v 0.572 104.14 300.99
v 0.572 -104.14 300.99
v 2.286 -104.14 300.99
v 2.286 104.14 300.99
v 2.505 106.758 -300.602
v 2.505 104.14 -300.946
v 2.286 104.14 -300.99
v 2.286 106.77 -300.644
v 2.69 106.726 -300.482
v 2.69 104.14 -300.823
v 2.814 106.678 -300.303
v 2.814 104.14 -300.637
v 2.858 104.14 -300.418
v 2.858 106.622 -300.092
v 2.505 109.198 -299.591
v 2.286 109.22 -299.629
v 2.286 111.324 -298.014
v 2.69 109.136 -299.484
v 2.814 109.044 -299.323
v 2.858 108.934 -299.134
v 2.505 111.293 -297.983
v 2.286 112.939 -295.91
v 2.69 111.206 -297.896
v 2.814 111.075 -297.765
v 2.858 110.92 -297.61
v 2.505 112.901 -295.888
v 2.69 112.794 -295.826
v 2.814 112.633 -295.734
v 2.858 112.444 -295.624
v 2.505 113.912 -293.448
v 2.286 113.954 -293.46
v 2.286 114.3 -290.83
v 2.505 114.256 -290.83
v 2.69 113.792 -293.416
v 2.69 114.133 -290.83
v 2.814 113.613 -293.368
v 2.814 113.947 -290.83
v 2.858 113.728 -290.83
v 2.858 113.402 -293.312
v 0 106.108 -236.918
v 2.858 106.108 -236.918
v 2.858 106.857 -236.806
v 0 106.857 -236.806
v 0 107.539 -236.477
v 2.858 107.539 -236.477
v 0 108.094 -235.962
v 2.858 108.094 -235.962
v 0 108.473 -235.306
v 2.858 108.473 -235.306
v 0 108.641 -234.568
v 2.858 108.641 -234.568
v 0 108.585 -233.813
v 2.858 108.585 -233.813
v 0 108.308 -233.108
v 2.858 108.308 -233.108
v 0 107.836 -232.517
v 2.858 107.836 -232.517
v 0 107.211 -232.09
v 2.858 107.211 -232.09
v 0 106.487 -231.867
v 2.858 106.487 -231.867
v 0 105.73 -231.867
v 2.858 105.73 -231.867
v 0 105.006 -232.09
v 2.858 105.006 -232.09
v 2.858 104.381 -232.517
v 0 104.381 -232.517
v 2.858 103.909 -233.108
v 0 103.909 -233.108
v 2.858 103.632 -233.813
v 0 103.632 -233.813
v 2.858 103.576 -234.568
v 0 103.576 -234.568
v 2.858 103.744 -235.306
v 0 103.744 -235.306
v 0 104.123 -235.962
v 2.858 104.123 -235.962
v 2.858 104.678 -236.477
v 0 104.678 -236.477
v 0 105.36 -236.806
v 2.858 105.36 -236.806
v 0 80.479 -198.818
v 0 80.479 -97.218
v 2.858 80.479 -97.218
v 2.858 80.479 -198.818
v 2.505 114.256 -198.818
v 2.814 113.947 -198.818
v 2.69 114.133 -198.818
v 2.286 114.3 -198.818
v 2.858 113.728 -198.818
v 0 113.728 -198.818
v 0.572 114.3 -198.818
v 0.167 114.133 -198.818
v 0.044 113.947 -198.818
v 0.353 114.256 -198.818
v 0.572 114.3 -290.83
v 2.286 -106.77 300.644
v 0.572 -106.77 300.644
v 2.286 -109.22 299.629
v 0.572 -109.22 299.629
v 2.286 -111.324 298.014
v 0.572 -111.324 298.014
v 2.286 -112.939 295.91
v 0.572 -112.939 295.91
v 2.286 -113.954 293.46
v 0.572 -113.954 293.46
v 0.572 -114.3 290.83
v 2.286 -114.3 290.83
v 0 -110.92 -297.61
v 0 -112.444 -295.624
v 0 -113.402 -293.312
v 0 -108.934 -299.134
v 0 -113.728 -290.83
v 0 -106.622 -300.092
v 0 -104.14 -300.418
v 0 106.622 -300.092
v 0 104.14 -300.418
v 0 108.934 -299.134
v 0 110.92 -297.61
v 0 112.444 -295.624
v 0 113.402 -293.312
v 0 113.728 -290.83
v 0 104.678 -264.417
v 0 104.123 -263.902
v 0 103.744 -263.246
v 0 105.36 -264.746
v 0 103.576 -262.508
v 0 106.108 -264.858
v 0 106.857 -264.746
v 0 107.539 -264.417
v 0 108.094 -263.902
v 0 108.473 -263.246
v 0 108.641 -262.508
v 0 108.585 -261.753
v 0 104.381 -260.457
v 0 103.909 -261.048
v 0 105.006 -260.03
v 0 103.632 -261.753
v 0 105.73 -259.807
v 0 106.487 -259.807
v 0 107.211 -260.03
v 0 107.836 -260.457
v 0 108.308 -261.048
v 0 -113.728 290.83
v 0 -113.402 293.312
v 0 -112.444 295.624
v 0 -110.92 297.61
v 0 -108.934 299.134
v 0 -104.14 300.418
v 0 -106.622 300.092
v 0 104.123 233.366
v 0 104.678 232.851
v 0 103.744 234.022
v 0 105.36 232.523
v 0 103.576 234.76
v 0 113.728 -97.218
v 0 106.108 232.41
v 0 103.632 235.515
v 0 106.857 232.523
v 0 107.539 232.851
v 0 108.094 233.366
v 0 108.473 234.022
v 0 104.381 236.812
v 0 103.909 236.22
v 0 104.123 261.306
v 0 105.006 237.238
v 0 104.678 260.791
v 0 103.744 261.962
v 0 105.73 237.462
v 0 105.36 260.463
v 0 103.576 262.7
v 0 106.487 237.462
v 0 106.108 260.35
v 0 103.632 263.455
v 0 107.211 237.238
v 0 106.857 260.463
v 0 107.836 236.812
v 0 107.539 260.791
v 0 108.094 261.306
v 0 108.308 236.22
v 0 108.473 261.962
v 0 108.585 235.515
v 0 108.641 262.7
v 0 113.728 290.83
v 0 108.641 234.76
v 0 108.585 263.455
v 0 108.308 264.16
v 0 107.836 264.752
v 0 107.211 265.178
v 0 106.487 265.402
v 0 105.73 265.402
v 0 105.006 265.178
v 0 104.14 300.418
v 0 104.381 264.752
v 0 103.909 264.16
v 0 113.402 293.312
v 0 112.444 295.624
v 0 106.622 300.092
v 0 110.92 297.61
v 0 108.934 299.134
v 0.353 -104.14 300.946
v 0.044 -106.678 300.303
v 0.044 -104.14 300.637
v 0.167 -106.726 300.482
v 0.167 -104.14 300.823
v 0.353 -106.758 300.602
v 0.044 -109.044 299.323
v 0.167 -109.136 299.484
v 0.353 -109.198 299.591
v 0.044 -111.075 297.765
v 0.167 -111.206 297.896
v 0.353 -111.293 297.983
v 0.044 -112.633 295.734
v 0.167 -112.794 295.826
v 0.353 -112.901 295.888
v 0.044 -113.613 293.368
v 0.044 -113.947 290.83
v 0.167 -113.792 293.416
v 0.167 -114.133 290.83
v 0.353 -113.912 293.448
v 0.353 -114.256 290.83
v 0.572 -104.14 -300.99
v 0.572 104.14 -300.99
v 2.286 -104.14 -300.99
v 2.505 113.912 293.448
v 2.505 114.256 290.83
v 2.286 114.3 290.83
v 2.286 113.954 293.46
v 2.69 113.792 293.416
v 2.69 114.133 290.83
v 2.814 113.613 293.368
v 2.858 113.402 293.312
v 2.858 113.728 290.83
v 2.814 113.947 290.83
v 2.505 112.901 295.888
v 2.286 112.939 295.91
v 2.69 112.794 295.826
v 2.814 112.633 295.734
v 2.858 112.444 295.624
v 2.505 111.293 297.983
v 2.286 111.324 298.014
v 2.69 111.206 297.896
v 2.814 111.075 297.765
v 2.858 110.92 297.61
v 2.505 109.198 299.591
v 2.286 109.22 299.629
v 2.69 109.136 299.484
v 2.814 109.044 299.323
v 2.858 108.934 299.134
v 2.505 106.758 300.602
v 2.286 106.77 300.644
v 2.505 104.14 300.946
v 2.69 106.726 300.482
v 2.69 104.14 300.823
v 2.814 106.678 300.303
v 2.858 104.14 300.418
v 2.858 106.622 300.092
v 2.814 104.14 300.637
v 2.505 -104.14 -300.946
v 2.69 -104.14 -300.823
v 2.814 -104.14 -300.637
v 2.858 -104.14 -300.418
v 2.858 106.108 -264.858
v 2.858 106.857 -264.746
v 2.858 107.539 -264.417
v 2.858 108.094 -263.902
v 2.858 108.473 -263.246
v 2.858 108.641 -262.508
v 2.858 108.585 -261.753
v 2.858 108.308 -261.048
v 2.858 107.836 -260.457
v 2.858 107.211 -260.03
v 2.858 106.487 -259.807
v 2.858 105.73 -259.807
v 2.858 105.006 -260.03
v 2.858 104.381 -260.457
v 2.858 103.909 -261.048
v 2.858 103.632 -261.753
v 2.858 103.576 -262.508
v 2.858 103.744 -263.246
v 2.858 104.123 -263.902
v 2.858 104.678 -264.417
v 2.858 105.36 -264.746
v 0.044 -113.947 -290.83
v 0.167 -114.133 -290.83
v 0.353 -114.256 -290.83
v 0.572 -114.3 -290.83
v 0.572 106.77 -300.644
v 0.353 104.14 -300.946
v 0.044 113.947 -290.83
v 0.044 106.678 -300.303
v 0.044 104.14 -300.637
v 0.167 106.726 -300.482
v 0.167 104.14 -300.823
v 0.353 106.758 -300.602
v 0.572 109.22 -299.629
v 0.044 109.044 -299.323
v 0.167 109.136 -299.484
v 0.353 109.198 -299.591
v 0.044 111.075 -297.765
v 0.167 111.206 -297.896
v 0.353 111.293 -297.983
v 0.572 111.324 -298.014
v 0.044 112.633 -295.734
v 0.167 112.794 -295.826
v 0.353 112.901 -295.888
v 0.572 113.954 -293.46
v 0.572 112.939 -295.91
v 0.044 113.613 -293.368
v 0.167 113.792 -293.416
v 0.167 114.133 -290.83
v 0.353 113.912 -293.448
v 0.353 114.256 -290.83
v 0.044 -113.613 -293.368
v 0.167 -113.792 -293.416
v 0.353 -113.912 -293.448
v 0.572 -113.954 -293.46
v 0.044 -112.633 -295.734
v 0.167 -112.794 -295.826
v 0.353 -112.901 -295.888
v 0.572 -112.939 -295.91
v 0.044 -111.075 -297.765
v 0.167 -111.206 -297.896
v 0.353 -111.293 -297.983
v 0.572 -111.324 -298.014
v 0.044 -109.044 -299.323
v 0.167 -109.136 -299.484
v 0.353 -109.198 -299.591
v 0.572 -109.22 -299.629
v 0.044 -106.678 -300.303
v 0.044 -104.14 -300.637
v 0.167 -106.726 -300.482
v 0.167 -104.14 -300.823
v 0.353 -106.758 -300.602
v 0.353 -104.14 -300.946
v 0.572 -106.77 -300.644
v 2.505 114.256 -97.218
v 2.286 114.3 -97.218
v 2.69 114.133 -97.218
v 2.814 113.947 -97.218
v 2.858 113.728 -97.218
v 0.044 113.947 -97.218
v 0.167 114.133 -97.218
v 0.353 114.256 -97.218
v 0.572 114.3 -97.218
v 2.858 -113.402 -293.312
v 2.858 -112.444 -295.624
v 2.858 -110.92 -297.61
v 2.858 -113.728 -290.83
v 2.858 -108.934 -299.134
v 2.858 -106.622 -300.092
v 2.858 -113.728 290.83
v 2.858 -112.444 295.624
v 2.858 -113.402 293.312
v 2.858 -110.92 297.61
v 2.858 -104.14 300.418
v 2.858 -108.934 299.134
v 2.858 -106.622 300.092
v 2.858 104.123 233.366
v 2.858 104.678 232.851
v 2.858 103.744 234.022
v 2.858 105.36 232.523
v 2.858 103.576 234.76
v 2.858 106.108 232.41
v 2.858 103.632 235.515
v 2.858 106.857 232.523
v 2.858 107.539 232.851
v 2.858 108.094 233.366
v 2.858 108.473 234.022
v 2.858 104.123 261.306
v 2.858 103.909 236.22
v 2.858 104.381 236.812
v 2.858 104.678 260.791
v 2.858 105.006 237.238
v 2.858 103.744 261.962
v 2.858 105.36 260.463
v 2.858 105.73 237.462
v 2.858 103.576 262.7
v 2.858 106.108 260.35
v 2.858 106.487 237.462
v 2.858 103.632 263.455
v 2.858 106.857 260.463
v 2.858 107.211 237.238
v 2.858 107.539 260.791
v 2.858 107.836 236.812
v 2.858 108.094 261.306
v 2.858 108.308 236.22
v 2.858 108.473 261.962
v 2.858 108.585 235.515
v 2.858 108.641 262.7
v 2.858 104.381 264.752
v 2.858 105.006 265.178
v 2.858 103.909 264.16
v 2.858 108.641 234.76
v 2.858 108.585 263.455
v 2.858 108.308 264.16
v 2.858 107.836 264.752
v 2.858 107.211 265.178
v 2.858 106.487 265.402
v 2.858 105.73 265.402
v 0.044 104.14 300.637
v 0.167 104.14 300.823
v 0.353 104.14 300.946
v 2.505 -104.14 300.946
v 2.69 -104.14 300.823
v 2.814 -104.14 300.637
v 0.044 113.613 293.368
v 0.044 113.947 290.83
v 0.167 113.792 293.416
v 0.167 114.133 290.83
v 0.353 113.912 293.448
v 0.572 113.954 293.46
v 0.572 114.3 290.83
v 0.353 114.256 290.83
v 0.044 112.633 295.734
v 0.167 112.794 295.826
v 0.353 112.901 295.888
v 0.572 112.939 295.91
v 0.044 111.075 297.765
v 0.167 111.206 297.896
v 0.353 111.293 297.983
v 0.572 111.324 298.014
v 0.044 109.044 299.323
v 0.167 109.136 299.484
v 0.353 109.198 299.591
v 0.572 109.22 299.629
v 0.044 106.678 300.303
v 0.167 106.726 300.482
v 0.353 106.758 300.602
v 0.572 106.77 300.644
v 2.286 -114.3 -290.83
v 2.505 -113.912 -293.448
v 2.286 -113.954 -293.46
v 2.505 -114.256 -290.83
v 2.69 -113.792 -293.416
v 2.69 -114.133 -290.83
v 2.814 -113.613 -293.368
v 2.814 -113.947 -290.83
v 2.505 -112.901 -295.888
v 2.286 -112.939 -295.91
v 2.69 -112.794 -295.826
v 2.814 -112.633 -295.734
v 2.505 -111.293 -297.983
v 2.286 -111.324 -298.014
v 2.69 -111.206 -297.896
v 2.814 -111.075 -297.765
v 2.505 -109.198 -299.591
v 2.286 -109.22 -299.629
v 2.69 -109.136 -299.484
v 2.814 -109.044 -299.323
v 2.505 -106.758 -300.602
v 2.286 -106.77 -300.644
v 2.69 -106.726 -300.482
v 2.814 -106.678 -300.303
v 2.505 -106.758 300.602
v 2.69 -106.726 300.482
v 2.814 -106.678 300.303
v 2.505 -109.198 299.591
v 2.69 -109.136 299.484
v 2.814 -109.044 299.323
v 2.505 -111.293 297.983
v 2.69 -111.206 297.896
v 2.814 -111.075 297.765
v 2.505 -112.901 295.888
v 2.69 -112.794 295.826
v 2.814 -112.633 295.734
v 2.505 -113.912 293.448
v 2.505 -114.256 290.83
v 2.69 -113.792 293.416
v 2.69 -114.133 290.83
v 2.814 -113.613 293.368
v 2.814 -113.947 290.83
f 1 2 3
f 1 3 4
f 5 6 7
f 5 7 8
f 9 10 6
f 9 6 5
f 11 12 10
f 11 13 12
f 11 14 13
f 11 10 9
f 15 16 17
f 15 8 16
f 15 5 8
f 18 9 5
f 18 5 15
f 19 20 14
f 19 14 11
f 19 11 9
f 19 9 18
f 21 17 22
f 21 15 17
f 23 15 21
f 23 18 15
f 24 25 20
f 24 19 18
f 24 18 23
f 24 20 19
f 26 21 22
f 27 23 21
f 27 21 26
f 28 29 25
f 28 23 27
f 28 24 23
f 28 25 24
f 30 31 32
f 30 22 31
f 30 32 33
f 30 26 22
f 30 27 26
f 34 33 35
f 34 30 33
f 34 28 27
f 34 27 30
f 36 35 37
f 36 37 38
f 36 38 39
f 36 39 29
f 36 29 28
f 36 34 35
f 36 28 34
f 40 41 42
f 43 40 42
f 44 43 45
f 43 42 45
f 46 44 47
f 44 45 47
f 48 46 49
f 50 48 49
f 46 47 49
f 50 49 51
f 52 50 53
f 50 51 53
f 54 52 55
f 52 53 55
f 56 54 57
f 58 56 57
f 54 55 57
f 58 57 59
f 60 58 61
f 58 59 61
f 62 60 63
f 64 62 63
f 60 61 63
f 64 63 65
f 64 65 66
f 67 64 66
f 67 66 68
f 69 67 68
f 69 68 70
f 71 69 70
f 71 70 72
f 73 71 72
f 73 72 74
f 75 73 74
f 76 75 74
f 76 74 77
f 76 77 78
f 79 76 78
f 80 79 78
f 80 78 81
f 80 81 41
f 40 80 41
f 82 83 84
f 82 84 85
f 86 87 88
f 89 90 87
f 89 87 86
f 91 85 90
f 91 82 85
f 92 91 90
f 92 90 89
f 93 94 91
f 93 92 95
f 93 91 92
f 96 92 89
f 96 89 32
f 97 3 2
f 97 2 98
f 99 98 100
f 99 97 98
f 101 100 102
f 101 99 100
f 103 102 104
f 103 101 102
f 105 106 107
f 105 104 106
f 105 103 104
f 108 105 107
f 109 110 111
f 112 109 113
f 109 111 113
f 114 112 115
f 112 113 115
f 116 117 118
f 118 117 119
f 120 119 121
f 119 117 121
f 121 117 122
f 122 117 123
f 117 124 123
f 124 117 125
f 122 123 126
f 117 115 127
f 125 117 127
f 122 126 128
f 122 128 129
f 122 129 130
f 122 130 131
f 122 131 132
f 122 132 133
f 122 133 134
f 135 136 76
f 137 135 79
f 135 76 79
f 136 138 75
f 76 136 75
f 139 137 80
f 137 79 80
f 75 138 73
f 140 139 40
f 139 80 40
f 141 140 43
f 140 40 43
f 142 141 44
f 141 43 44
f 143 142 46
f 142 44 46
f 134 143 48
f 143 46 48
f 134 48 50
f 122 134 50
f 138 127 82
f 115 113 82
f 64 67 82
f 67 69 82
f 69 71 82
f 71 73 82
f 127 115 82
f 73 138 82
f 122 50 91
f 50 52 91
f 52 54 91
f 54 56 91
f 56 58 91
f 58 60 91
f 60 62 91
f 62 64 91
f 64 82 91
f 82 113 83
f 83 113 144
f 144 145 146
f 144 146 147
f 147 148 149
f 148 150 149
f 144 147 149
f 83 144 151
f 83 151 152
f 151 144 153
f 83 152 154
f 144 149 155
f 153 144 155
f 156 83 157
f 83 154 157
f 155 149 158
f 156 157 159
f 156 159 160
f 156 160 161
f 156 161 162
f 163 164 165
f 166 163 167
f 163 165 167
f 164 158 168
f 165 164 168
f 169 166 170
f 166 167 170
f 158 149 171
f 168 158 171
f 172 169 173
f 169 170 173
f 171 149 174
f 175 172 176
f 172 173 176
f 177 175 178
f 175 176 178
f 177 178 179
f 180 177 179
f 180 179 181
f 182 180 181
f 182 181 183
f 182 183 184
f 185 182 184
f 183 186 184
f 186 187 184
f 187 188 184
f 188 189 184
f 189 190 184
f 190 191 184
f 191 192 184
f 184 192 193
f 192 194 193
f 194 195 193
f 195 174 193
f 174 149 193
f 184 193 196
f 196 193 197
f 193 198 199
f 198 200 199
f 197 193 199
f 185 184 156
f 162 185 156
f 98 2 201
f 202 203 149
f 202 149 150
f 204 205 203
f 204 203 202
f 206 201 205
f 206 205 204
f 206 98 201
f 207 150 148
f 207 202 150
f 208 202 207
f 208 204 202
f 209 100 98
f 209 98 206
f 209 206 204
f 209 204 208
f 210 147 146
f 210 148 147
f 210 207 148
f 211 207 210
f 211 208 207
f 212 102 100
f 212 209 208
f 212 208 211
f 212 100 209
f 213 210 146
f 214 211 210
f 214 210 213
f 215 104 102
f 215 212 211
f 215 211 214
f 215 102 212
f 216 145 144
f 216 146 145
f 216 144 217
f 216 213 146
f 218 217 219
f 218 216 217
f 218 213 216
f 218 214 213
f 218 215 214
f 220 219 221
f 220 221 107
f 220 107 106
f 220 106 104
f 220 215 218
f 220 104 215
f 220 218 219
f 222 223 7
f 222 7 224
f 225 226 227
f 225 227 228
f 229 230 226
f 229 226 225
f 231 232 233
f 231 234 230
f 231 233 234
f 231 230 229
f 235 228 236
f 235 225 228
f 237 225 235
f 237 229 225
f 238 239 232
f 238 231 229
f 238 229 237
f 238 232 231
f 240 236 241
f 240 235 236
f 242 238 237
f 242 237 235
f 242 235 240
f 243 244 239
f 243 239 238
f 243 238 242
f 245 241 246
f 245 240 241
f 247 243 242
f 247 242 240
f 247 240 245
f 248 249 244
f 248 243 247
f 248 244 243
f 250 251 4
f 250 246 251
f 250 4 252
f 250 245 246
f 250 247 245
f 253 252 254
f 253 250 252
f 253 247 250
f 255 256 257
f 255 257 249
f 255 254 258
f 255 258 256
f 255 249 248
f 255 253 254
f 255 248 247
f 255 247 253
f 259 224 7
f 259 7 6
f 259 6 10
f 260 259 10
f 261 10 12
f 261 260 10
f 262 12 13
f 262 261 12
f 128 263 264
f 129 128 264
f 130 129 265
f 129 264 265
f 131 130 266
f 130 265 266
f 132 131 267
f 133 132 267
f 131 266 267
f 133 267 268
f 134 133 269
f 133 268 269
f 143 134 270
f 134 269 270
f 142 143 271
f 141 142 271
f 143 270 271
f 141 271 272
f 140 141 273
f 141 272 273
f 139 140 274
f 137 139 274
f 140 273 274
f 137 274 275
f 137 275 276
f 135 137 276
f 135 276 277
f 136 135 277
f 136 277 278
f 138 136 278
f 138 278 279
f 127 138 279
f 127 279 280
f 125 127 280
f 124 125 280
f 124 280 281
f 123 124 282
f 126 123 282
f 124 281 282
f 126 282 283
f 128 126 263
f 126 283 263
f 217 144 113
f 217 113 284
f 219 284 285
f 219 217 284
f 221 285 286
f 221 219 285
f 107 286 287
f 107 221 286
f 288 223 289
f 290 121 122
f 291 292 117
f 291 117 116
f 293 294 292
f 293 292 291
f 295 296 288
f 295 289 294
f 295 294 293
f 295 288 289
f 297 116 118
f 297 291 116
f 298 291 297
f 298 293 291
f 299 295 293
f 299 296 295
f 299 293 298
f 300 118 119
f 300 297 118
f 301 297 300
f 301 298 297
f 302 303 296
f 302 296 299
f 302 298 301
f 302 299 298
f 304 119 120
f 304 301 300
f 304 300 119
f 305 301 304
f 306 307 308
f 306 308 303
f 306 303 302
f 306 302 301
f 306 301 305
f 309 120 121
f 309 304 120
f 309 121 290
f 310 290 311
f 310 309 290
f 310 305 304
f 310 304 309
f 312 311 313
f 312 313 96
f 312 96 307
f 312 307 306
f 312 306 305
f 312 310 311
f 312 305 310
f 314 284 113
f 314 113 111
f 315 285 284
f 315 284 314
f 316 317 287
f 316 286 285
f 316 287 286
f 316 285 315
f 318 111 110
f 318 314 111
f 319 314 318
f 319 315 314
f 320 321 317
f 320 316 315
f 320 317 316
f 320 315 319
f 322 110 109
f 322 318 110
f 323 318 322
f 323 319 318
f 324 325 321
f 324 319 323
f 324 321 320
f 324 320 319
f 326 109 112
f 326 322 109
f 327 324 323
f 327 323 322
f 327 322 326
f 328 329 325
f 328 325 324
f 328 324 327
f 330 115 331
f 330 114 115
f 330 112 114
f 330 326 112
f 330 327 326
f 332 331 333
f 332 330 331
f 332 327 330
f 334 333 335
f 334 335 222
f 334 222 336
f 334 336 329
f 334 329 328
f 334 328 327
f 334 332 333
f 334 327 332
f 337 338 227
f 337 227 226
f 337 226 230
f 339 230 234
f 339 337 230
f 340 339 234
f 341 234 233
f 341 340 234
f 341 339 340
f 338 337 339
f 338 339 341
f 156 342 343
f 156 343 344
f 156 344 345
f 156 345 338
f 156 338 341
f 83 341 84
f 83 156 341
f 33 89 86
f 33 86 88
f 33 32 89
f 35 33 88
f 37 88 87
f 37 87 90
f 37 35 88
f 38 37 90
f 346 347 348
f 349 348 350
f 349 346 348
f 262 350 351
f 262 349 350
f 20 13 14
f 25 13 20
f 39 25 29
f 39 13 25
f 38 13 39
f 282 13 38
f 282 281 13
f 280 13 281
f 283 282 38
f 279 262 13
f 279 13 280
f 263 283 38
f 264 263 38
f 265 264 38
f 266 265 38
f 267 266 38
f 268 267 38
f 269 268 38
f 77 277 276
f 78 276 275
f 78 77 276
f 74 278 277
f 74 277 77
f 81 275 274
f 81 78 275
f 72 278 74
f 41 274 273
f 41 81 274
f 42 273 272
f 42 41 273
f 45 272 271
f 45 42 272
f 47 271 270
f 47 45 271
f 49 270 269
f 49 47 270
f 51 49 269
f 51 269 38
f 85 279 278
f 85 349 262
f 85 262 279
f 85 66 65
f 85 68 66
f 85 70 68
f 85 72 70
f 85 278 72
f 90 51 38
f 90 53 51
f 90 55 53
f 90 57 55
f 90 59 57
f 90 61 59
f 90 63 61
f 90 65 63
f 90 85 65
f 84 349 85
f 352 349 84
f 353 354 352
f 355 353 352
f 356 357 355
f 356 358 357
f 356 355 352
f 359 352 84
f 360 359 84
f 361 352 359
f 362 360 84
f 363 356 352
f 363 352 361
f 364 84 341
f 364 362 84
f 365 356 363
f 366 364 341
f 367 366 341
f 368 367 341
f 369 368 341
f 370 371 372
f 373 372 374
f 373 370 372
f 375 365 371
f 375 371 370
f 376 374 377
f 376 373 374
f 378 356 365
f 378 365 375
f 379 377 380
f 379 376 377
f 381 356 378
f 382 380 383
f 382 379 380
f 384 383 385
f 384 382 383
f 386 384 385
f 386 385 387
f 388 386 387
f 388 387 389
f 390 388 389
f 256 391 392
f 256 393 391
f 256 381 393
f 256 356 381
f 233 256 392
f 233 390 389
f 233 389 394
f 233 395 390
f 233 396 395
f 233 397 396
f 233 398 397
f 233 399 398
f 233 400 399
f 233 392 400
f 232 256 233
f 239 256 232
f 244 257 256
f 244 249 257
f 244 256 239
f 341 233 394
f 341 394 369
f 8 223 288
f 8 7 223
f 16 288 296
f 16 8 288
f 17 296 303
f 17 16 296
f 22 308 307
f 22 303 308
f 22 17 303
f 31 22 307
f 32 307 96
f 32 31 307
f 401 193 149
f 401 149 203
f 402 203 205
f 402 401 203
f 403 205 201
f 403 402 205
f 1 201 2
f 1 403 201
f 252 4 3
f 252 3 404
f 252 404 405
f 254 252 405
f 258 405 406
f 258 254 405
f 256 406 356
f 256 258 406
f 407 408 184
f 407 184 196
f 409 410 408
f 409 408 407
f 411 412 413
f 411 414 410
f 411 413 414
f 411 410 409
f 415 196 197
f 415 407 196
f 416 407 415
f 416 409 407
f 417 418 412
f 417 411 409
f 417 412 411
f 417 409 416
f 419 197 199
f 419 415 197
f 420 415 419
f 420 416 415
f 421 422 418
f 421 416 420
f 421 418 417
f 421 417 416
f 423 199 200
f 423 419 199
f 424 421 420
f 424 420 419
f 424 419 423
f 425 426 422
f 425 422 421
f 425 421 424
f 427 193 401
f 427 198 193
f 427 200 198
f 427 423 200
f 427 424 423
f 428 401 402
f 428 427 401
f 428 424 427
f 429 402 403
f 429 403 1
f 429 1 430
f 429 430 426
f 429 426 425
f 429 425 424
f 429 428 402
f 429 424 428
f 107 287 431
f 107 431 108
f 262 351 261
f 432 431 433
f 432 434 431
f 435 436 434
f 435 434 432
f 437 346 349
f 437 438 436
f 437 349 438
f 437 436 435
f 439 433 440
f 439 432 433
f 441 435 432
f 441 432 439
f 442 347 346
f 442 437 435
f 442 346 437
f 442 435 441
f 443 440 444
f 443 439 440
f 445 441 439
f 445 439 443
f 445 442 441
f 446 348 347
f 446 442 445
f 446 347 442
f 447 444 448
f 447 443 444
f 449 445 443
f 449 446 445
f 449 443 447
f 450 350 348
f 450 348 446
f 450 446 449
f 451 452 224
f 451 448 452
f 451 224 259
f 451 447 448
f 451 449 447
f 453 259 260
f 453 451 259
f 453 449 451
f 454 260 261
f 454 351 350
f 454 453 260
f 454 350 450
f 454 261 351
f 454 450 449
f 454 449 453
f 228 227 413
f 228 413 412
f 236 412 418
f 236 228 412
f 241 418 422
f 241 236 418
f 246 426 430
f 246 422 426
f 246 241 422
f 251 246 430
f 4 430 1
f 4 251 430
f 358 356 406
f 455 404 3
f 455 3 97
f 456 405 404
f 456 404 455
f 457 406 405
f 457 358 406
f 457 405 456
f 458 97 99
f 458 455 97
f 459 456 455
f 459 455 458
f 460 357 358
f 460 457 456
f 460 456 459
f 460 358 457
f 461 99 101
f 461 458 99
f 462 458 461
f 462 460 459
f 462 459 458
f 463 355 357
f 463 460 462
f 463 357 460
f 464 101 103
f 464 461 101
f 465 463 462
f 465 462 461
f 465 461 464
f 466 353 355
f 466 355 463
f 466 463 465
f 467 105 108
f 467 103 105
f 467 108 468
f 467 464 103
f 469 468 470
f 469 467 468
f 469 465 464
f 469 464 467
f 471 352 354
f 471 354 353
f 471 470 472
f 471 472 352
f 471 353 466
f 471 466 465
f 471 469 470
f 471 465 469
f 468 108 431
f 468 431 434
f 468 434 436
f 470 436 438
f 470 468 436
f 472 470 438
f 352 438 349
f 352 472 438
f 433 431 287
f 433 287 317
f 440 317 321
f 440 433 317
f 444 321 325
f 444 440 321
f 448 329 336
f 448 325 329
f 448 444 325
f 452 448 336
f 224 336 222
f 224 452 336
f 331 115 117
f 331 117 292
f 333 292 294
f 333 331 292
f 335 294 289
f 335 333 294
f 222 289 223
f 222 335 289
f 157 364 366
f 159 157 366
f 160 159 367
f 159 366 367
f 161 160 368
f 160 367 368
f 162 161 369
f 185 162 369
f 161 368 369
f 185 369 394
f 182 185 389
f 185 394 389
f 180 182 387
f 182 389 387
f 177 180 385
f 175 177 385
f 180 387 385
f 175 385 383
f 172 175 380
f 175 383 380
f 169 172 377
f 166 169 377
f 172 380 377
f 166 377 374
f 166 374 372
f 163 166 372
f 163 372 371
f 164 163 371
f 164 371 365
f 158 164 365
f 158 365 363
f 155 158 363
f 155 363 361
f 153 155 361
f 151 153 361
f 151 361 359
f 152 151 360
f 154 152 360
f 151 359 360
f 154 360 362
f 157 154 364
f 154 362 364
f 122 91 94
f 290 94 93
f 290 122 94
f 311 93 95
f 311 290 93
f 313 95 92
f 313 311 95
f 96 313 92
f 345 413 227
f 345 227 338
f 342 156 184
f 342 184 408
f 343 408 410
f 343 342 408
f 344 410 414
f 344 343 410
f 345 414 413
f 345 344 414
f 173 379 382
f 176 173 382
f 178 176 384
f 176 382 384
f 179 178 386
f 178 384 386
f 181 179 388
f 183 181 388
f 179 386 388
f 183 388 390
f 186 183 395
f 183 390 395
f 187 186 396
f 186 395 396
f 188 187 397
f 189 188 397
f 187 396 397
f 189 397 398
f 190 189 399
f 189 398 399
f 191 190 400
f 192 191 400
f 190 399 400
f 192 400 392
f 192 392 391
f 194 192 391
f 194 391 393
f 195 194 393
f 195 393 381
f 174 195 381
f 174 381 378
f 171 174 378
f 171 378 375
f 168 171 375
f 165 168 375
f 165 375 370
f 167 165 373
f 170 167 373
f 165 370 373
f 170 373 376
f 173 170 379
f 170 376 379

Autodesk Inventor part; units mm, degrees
ref_plane "YZ Plane" through (0, 0, 0) normal (1, 0, 0) x (0, 1, 0)
ref_plane "XZ Plane" through (0, 0, 0) normal (0, 1, 0) x (-1, 0, 0)
ref_plane "XY Plane" through (0, 0, 0) normal (0, 0, 1) x (1, 0, 0)
sketch "Sketch1" plane through (0, 0, 0) normal (1, 0, 0) x (0, 1, 0)
  line L0 (-114.3, 300.99) -> (114.3, 300.99)
  line L1 (114.3, 300.99) -> (114.3, -300.99)
  line L2 (114.3, -300.99) -> (-114.3, -300.99)
  line L3 (-114.3, -300.99) -> (-114.3, 300.99)
  line L4 (-114.3, 300.99) -> (114.3, -300.99) construction
  line L5 (114.3, 300.99) -> (-114.3, -300.99) construction
  point P0 (0, 0)
  dimension "d3" = 228.6
  dimension "d4" = 601.98
extrude "Extrusion2" add sketch "Sketch1" along normal blind 2.8575
fillet "Fillet1" radius 10.16 4 edges at (1.4287, -114.3, -300.99) (1.4287, 114.3, -300.99) (1.4287, -114.3, 300.99) (1.4287, 114.3, 300.99)
fillet "Fillet2" radius 0.5715 16 edges at (2.8575, 111.3242, 298.0142) (2.8575, 0, 300.99) (2.8575, -111.3242, 298.0142) (2.8575, -114.3, 0) (2.8575, -111.3242, -298.0142) (2.8575, 0, -300.99) (2.8575, 111.3242, -298.0142) (2.8575, 114.3, 0) (0, 111.3242, -298.0142) (0, 0, -300.99) (0, -111.3242, -298.0142) (0, -114.3, 0) (0, -111.3242, 298.0142) (0, 0, 300.99) (0, 111.3242, 298.0142) (0, 114.3, 0)
sketch "Sketch3" plane through (0, 0, 0) normal (-1, 0, 0) x (0, 0, 1)
  line L0 (300.4185, 104.14) -> (300.4185, -104.14) projected
  line L1 (290.83, -113.7285) -> (-290.83, -113.7285) projected
  line L2 (-290.83, 113.7285) -> (290.83, 113.7285) projected
  line L3 (-300.4185, -104.14) -> (-300.4185, 104.14) projected
  line L4 (290.83, 113.7285) -> (-290.83, 113.7285) projected
  line L5 (-97.2185, 125.0999) -> (-97.2185, 80.4789)
  line L6 (-97.2185, 80.4789) -> (-198.8185, 80.4789)
  line L7 (-198.8185, 80.4789) -> (-198.8185, 125.0999)
  line L8 (-97.2185, 125.0999) -> (-198.8185, 125.0999)
  dimension "d48" = 101.6
  dimension "d49" = 101.6
  dimension "d50" = 0
  dimension "d63" = 11.3714
  dimension "d64" = 33.2496
extrude "Extrusion3" cut sketch "Sketch3" against normal blind 5.08
sketch "Sketch4" plane through (2.8575, 0, 0) normal (1, 0, 0) x (0, 0, -1)
  circle A0 centre (234.3785, 106.1085) radius 2.54
  circle A1 centre (262.3185, 106.1085) radius 2.54
  line L0 (-290.83, 113.7285) -> (290.83, 113.7285) projected
  line L1 (300.4185, 104.14) -> (300.4185, -104.14) projected
  circle A2 centre (-262.89, 106.1085) radius 2.54
  circle A3 centre (-234.95, 106.1085) radius 2.54
  line L2 (-300.99, 104.14) -> (-300.99, -104.14) projected
  point P0 (0, 0)
  point P1 (198.8185, 113.7285)
  dimension "d52" = 5.08
  dimension "d53" = 7.62
  dimension "d54" = 27.94
  dimension "d55" = 38.1
  dimension "d58" = 27.94
  dimension "d60" = 38.1
extrude "Extrusion5" cut sketch "Sketch4" against normal up to next
equation "\"d58\" = d54"
equation "\"d60\" = d55"
equation "\"d61\" = d54"
properties part number "SideFlap"
